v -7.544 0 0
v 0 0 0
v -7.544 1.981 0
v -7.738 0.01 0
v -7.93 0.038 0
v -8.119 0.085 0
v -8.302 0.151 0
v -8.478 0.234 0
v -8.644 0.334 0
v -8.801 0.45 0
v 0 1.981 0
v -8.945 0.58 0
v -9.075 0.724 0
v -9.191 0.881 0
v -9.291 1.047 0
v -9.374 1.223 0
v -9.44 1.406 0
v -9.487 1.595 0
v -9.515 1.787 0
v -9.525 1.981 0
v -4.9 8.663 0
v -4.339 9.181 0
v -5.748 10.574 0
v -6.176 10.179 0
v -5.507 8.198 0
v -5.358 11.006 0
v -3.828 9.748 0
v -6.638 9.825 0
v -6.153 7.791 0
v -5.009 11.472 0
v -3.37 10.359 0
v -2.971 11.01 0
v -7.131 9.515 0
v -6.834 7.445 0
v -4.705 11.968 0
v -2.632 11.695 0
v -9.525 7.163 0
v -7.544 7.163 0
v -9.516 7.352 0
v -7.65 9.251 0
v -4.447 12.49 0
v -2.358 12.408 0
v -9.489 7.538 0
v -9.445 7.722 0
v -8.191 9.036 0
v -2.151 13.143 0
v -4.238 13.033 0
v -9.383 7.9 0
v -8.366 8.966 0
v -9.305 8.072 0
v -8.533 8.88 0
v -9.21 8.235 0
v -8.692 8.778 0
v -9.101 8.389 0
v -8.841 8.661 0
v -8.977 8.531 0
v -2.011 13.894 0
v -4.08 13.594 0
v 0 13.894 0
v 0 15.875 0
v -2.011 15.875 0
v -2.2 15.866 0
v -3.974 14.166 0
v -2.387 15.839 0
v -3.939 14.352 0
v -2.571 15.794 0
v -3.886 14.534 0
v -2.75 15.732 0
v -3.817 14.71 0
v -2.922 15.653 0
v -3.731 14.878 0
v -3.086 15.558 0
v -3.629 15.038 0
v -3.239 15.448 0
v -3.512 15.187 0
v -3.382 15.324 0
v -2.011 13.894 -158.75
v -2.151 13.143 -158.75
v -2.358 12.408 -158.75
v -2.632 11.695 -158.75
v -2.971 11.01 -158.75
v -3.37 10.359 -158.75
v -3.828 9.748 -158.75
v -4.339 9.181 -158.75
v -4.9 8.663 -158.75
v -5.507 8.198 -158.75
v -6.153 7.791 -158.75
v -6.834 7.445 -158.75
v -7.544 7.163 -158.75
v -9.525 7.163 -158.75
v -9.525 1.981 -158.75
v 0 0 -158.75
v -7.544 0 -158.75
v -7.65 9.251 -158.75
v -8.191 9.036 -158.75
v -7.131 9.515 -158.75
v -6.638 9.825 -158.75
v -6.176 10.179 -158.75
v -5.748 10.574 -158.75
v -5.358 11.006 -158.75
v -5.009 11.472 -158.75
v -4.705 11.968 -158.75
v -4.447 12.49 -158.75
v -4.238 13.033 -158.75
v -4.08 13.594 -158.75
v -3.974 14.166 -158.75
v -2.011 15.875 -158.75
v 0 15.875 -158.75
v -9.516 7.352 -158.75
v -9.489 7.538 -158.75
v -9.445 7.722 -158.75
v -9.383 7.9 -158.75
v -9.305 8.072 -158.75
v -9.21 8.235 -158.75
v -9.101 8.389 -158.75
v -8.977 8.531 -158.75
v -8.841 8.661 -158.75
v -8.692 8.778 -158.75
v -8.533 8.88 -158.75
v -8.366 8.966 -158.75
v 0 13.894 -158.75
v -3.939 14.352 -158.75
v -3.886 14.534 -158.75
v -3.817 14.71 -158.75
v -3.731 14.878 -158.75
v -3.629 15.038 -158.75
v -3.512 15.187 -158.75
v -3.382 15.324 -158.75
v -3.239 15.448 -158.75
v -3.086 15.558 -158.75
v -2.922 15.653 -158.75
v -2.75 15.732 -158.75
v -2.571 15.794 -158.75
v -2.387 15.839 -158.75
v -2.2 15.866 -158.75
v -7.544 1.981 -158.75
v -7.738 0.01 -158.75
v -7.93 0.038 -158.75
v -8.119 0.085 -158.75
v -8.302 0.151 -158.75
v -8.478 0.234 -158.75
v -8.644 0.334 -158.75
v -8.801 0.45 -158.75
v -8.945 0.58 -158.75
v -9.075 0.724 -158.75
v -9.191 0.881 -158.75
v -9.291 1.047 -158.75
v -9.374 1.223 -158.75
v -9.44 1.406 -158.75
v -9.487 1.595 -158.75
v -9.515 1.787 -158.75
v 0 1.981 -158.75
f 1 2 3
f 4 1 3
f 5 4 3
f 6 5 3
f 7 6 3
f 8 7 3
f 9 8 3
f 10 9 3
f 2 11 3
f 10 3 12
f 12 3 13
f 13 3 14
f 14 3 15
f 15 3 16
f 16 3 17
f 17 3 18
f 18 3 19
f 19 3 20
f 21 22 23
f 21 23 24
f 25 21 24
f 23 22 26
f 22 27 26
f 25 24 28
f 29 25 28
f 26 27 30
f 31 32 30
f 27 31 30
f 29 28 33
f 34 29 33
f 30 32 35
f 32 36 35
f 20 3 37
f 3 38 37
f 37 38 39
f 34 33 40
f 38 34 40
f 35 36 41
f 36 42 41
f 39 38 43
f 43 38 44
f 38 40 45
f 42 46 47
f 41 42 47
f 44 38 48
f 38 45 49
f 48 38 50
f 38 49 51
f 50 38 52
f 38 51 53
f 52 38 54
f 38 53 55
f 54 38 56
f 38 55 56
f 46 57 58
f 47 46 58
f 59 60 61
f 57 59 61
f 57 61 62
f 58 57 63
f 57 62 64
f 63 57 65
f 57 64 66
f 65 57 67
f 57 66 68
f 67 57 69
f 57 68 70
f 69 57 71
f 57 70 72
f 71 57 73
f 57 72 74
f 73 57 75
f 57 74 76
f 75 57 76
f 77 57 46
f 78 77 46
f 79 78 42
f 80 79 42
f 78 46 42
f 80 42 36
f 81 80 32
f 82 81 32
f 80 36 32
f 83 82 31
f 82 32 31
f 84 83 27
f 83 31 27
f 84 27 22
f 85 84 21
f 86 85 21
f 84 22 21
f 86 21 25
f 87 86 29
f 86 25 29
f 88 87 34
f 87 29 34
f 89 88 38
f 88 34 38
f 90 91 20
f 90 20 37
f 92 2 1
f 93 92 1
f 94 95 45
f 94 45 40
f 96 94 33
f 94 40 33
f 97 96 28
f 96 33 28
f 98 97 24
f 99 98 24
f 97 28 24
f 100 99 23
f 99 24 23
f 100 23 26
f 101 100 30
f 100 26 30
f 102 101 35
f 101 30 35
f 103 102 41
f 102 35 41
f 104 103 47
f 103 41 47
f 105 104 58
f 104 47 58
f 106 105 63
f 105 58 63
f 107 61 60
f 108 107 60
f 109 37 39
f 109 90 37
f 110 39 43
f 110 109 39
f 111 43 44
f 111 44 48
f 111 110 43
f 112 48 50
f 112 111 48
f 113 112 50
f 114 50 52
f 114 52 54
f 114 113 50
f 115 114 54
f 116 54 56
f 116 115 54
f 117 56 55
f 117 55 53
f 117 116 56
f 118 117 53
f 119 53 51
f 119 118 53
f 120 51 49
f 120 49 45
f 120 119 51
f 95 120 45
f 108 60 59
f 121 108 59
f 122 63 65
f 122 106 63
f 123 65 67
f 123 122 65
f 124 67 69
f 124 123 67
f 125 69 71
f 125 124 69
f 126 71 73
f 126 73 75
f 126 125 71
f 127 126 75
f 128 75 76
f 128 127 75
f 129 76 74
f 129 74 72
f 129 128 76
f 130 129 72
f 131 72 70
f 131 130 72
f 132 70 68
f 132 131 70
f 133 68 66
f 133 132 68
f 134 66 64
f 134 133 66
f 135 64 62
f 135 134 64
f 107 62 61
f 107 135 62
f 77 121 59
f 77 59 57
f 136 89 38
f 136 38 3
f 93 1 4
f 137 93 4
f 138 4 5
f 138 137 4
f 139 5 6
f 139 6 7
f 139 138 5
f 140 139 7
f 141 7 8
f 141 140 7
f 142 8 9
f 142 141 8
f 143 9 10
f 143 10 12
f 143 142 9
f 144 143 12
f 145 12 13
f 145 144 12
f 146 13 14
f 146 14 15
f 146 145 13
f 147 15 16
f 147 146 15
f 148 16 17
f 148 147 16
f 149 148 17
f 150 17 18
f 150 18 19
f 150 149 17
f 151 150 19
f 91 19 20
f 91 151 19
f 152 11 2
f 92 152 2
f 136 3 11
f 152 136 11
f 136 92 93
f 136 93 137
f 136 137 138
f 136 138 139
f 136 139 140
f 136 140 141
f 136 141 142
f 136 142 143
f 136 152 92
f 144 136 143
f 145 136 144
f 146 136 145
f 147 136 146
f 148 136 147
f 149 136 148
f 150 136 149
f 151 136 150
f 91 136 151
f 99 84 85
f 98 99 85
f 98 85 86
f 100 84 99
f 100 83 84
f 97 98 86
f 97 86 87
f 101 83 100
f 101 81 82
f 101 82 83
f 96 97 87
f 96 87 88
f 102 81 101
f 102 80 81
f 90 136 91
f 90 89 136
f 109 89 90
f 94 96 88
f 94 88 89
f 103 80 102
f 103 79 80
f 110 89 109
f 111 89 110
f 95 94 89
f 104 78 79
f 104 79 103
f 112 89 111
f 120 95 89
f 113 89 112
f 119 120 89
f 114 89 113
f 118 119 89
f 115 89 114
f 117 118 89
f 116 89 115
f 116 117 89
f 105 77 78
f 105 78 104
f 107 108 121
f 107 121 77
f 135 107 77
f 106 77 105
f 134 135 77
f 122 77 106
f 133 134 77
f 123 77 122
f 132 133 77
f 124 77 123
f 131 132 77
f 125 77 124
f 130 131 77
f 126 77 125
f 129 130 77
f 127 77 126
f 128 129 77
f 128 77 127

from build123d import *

# Parameters (mm, degrees)
EXTRUDE_THIN1_DEPTH = 158.75
FILLET1_R           = 1.9812


with BuildPart() as part:
    # Sketch1 → Extrude-Thin1 (new body)
    with BuildSketch(Plane.XY):
        with BuildLine():
            Line((0, 0), (-9.525, 0))
            Line((-9.525, 0), (-9.525, 8.73125))
            ThreePointArc((-9.525, 8.73125), (-5.250982158, 11.13965279), (-3.96875, 15.875))
            Line((-3.96875, 15.875), (0, 15.875))
            Line((0, 15.875), (0, 13.8938))
            Line((0, 13.8938), (-2.011138875, 13.8938))
            ThreePointArc((-2.011138875, 13.8938), (-3.827545416, 9.747705801), (-7.5438, 7.163352557))
            Line((-7.5438, 7.163352557), (-7.5438, 1.9812))
            Line((-7.5438, 1.9812), (0, 1.9812))
            Line((0, 1.9812), (0, 0))
        make_face()
    extrude(amount=-EXTRUDE_THIN1_DEPTH)

    # Fillet1
    fillet1_edges = [part.edges().sort_by_distance(p)[0] for p in [
        (-9.525, 0, -79.375),
        (-9.525, 8.73125, -79.375),
        (-3.96875, 15.875, -79.375),
    ]]
    fillet(fillet1_edges, radius=FILLET1_R)


solid = part.part
